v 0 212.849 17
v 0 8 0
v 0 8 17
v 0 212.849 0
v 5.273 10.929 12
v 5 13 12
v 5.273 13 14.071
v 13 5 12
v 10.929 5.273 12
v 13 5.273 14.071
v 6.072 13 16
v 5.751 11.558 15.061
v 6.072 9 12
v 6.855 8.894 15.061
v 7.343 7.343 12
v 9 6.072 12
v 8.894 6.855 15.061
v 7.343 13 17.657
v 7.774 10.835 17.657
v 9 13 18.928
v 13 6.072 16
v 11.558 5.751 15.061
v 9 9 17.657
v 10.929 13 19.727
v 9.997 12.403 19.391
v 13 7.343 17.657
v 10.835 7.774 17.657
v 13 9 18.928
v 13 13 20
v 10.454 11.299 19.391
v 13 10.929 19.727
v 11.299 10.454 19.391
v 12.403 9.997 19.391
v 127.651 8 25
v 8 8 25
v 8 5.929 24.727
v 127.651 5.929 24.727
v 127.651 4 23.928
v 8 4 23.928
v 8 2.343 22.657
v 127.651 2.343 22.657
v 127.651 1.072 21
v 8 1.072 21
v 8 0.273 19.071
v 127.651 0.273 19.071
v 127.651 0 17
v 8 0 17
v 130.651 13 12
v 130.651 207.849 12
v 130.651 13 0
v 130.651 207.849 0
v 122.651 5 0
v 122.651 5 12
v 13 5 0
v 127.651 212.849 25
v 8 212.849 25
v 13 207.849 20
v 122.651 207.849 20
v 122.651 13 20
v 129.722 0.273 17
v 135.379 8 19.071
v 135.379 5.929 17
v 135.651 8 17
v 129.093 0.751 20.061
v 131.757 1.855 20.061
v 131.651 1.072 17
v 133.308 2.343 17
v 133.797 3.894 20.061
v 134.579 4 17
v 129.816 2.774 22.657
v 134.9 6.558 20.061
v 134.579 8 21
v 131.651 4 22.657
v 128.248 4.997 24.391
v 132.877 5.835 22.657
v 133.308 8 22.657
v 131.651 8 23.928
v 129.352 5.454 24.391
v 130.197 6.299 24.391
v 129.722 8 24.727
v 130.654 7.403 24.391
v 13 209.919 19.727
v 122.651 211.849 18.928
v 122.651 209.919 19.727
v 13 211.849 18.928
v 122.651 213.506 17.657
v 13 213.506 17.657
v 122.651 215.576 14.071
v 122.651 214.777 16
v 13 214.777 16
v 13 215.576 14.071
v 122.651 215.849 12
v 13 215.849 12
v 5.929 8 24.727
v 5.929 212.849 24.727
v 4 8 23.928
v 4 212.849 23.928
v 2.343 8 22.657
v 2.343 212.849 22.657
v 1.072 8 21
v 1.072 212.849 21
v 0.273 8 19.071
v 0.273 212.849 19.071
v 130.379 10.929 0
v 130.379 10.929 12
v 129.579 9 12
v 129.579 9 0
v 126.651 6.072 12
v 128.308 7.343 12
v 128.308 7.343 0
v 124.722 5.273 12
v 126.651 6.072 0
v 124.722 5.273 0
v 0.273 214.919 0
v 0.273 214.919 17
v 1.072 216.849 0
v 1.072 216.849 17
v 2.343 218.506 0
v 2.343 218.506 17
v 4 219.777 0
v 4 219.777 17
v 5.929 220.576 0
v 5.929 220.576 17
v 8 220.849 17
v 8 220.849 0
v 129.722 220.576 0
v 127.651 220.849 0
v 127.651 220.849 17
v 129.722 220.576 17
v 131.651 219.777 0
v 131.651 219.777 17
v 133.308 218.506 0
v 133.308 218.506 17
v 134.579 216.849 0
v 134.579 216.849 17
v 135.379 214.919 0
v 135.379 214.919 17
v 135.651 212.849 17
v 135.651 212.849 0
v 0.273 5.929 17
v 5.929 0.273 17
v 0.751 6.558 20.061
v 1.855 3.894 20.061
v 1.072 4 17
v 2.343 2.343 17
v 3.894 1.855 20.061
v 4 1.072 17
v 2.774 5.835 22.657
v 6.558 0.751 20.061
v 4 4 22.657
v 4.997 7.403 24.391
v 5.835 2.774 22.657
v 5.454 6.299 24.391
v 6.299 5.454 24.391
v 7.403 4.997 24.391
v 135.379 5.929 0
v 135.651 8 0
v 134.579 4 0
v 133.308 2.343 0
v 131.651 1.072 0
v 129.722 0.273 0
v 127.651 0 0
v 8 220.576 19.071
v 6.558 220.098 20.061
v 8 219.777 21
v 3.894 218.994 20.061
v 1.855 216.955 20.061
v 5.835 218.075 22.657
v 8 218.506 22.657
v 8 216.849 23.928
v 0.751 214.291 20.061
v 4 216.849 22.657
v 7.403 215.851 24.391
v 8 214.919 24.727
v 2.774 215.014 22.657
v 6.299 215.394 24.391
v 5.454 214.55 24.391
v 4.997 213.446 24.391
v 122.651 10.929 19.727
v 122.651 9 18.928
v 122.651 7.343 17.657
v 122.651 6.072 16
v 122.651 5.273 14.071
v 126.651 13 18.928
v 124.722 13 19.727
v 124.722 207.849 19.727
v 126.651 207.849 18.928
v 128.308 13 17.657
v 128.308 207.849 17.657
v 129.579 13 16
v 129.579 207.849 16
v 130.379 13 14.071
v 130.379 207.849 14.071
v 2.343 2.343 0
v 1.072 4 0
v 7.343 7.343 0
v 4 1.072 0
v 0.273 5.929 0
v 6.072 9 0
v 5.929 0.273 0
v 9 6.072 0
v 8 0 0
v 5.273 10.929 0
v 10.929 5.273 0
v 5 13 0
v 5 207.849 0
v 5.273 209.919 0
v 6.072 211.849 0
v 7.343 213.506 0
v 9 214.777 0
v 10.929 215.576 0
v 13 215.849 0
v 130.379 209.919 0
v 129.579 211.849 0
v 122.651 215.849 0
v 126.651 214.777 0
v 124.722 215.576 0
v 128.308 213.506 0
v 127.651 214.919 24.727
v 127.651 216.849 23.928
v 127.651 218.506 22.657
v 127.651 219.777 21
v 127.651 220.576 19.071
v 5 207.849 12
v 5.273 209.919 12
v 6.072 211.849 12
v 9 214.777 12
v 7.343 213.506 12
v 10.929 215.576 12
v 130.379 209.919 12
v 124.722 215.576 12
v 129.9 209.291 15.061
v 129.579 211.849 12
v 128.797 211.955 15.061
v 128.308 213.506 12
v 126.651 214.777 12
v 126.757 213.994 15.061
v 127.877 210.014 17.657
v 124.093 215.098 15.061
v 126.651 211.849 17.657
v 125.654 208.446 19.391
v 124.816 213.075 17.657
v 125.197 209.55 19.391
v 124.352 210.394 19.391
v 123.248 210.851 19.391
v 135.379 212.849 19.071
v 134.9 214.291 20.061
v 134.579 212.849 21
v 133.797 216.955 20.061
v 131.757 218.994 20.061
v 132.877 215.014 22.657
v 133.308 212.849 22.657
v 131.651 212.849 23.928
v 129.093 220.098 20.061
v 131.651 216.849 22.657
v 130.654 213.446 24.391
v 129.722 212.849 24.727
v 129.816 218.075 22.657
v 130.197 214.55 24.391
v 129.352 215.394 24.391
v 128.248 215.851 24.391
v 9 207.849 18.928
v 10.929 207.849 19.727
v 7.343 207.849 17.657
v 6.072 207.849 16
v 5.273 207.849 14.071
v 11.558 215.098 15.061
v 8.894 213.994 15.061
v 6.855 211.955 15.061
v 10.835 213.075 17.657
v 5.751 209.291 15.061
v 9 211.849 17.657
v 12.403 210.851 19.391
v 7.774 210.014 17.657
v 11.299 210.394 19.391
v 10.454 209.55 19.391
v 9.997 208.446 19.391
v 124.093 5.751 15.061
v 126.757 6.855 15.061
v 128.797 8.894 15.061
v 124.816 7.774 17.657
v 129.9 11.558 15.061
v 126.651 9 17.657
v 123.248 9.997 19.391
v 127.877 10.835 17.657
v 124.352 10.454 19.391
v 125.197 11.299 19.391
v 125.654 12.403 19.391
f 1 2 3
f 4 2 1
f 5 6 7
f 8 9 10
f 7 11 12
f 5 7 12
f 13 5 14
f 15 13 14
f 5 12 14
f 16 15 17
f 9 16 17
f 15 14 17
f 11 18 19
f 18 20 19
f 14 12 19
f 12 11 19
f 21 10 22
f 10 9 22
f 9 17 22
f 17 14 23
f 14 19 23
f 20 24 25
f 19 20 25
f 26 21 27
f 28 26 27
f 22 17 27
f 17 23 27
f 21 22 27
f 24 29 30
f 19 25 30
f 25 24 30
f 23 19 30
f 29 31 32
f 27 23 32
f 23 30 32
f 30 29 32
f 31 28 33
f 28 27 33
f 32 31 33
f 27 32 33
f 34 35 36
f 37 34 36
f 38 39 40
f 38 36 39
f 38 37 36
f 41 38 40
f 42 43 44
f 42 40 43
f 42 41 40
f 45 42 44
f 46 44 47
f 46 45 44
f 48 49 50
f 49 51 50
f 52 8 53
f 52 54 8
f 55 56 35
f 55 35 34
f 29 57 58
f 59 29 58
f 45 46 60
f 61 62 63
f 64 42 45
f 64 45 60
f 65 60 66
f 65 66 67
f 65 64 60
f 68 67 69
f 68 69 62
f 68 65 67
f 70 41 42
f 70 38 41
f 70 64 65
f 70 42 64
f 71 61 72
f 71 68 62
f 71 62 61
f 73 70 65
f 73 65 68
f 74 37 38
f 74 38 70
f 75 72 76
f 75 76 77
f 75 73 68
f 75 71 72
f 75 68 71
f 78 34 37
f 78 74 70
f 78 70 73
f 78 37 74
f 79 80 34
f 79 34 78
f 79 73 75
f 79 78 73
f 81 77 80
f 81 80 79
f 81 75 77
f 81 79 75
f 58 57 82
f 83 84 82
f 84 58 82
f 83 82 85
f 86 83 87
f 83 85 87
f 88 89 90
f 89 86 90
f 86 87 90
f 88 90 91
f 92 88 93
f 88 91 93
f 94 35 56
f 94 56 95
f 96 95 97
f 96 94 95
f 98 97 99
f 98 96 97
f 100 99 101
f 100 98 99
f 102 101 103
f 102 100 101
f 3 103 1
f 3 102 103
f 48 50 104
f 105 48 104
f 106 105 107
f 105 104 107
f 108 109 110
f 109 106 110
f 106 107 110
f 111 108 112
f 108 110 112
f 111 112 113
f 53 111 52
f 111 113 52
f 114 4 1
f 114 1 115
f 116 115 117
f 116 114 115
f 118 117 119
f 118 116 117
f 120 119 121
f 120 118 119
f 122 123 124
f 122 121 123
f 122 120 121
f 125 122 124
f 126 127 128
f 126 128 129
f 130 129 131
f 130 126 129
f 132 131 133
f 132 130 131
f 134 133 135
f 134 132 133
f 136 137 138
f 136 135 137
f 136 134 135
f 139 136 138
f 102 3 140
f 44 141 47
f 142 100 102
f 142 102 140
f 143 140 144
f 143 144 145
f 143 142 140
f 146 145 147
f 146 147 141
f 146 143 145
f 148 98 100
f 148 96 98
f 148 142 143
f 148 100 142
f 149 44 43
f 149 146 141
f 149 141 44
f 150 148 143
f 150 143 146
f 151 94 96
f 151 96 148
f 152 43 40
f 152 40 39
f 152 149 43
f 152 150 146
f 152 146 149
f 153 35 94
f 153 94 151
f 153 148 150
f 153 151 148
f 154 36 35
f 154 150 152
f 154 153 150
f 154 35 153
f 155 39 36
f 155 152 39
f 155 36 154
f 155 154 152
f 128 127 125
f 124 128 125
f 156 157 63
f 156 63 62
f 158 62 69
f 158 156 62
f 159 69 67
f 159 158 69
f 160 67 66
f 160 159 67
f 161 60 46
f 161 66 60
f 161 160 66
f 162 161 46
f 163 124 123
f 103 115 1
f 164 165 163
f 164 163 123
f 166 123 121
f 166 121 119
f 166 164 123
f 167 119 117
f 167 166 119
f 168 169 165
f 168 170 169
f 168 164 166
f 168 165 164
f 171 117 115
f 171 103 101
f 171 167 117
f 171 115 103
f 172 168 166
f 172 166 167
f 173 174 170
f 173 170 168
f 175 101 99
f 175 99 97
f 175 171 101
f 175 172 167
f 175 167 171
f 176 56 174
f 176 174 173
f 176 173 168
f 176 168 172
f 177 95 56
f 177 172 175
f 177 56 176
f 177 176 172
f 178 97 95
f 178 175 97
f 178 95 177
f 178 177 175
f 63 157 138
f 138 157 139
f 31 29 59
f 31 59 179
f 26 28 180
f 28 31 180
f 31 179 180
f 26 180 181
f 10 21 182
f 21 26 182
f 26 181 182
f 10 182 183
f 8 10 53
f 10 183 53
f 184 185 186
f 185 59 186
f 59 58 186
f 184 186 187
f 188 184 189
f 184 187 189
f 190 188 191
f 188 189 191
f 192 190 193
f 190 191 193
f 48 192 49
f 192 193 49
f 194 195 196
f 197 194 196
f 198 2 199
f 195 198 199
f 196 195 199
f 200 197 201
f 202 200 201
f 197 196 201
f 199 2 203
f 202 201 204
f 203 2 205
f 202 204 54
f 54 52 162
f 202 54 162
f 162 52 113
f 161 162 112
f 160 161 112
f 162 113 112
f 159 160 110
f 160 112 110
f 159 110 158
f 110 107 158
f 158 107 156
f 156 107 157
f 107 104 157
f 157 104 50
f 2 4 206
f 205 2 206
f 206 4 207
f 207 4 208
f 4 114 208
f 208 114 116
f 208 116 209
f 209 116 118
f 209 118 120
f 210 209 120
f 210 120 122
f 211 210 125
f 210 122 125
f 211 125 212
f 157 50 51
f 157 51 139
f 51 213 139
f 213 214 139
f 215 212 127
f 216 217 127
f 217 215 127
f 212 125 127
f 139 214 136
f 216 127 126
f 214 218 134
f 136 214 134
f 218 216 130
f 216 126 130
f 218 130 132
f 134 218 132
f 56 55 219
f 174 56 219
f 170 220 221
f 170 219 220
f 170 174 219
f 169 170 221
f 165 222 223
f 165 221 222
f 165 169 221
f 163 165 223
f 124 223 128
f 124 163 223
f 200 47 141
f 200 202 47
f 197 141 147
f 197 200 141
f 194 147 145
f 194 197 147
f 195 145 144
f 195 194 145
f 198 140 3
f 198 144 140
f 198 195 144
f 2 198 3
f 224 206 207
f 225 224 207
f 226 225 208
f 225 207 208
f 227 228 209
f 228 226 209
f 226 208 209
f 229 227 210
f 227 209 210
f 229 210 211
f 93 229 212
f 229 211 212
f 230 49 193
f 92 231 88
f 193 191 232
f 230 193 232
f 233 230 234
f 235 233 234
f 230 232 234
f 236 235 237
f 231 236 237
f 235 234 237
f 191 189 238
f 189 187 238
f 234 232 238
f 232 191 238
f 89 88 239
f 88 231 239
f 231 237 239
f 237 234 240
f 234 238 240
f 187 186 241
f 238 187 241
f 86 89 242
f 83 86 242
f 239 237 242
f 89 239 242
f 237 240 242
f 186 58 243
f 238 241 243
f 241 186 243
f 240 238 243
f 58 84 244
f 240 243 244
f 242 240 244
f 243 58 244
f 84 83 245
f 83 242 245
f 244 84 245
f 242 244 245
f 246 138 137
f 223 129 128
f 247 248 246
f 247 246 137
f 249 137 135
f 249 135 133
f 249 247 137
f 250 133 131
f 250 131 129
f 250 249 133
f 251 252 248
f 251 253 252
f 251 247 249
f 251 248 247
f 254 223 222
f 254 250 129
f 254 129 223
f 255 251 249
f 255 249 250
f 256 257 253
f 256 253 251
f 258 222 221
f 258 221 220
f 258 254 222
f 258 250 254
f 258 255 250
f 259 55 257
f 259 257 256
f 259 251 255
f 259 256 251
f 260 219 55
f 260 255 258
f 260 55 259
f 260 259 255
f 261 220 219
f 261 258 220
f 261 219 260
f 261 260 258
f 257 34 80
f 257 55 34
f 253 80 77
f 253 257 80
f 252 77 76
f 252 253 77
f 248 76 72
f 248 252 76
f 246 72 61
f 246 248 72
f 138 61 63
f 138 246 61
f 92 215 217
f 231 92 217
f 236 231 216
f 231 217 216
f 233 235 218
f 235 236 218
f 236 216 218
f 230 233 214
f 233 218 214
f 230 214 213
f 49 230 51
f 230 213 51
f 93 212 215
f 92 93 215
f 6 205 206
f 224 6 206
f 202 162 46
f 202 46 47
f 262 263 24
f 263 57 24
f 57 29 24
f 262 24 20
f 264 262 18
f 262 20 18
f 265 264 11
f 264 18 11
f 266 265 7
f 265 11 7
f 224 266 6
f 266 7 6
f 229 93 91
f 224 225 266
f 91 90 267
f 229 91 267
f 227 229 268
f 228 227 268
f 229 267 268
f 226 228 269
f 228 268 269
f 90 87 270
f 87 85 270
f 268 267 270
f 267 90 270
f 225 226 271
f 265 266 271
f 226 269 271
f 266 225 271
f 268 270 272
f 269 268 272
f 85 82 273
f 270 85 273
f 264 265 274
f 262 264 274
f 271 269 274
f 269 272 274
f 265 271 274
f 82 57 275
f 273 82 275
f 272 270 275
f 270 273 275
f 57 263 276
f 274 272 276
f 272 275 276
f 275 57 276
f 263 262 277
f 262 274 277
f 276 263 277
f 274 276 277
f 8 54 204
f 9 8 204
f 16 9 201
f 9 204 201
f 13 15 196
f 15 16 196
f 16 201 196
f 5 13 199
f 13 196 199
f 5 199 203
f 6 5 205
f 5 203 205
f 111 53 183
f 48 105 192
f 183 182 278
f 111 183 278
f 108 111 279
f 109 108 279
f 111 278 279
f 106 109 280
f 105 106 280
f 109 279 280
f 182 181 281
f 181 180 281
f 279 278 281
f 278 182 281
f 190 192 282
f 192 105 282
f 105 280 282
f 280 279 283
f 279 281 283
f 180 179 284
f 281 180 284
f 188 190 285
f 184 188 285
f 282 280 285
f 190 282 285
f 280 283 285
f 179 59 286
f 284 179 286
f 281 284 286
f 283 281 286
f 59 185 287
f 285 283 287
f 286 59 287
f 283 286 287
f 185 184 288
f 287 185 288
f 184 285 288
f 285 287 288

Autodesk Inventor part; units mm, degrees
ref_plane "YZ Plane" through (0, 0, 0) normal (1, 0, 0) x (0, 1, 0)
ref_plane "XZ Plane" through (0, 0, 0) normal (0, 1, 0) x (-1, 0, 0)
ref_plane "XY Plane" through (0, 0, 0) normal (0, 0, 1) x (1, 0, 0)
sketch "Эскиз1" plane through (0, 0, 0) normal (0, 0, 1) x (1, 0, 0)
  line L0 (5, 13) -> (5, 207.8488) projected
  arc A0 (13, 215.8488) -> (5, 207.8488) centre (13, 207.8488) ccw projected
  line L1 (13, 215.8488) -> (122.6512, 215.8488) projected
  arc A1 (130.6512, 207.8488) -> (122.6512, 215.8488) centre (122.6512, 207.8488) ccw projected
  line L2 (130.6512, 207.8488) -> (130.6512, 13) projected
  arc A2 (122.6512, 5) -> (130.6512, 13) centre (122.6512, 13) ccw projected
  line L3 (13, 5) -> (122.6512, 5) projected
  arc A3 (5, 13) -> (13, 5) centre (13, 13) ccw projected
  arc A4 (127.6512, 0) -> (135.6512, 8) centre (127.6512, 8) ccw projected
  line L4 (135.6512, 8) -> (135.6512, 212.8488) projected
  arc A5 (135.6512, 212.8488) -> (127.6512, 220.8488) centre (127.6512, 212.8488) ccw projected
  line L5 (127.6512, 220.8488) -> (8, 220.8488) projected
  arc A6 (8, 220.8488) -> (0, 212.8488) centre (8, 212.8488) ccw projected
  line L6 (0, 8) -> (0, 212.8488) projected
  arc A7 (0, 8) -> (8, 0) centre (8, 8) ccw projected
  line L7 (127.6512, 0) -> (8, 0) projected
  point P0 (0, 0)
extrude "Выдавливание1" add sketch "Эскиз1" along normal blind 20
sketch "Эскиз2" plane through (0, 0, 20) normal (0, 0, 1) x (1, 0, 0)
  line L0 (8, 0) -> (127.6512, 0) projected
  arc A0 (127.6512, 0) -> (135.6512, 8) centre (127.6512, 8) ccw projected
  line L1 (135.6512, 8) -> (135.6512, 212.8488) projected
  arc A1 (135.6512, 212.8488) -> (127.6512, 220.8488) centre (127.6512, 212.8488) ccw projected
  line L2 (127.6512, 220.8488) -> (8, 220.8488) projected
  arc A2 (8, 220.8488) -> (0, 212.8488) centre (8, 212.8488) ccw projected
  line L3 (0, 212.8488) -> (0, 8) projected
  arc A3 (0, 8) -> (8, 0) centre (8, 8) ccw projected
  arc A4 (5, 13) -> (13, 5) centre (13, 13) ccw projected
  line L4 (5, 13) -> (5, 207.8488) projected
  arc A5 (13, 215.8488) -> (5, 207.8488) centre (13, 207.8488) ccw projected
  line L5 (13, 215.8488) -> (122.6512, 215.8488) projected
  arc A6 (130.6512, 207.8488) -> (122.6512, 215.8488) centre (122.6512, 207.8488) ccw projected
  line L6 (130.6512, 207.8488) -> (130.6512, 13) projected
  arc A7 (122.6512, 5) -> (130.6512, 13) centre (122.6512, 13) ccw projected
  line L7 (122.6512, 5) -> (13, 5) projected
  point P0 (0, 0)
extrude "Выдавливание2" add sketch "Эскиз2" along normal blind 5 contours A3 L3 A2 L2 A1 L1 A0 L0 | L4 A5 L5 A6 L6 A7 L7 A4
fillet "Сопряжение1" radius 8 16 edges at (133.308, 218.5056, 25) (67.8256, 220.8488, 25) (2.3431, 218.5056, 25) (0, 110.4244, 25) (2.3431, 2.3431, 25) (67.8256, 0, 25) (133.308, 2.3431, 25) (135.6512, 110.4244, 25) (128.308, 7.3431, 20) (67.8256, 5, 20) (7.3431, 7.3431, 20) (5, 110.4244, 20) (7.3431, 213.5056, 20) (67.8256, 215.8488, 20) (128.308, 213.5056, 20) (130.6512, 110.4244, 20)
properties part number "kris"
